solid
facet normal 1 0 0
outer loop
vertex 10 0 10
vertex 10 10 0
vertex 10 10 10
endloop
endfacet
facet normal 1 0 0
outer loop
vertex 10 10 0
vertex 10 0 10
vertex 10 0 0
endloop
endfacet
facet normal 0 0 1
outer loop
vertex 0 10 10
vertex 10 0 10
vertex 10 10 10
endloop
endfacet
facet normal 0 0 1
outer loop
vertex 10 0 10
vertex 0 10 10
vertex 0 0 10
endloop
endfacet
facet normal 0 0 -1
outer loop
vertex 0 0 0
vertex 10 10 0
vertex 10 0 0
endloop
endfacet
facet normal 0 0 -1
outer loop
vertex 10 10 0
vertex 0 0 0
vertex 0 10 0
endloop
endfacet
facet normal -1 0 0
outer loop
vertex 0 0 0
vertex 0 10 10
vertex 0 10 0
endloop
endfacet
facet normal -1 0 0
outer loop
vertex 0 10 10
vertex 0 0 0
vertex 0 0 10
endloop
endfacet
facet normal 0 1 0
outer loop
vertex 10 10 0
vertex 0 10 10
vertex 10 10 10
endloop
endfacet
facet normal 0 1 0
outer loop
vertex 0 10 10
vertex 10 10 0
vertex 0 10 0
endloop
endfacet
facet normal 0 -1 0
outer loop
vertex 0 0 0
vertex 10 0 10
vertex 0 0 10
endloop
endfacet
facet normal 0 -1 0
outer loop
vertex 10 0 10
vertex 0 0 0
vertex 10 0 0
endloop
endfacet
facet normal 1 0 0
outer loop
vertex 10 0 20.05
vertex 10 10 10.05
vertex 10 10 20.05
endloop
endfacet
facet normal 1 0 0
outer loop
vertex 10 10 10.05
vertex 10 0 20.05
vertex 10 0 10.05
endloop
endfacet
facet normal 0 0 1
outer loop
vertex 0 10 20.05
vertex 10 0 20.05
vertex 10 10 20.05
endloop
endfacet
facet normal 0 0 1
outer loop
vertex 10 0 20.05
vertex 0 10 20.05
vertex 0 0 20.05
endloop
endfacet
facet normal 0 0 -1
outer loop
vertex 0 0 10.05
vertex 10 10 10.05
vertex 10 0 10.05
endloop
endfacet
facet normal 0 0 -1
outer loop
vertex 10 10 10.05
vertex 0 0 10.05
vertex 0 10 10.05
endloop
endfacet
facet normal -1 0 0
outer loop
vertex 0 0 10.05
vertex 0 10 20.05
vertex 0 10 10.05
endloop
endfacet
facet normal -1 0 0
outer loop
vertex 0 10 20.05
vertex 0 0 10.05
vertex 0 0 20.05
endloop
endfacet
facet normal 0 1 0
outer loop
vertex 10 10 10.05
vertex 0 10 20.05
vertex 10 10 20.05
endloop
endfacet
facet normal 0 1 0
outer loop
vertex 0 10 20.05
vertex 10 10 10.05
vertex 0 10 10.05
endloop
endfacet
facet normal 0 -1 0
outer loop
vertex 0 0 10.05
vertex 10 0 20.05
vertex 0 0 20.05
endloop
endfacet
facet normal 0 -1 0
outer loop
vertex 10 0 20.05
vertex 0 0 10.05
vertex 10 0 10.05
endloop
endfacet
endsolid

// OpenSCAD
gap_size = 0.05;

cube(10);
translate([0, 0, 10 + gap_size]) {
	cube(10);
}
